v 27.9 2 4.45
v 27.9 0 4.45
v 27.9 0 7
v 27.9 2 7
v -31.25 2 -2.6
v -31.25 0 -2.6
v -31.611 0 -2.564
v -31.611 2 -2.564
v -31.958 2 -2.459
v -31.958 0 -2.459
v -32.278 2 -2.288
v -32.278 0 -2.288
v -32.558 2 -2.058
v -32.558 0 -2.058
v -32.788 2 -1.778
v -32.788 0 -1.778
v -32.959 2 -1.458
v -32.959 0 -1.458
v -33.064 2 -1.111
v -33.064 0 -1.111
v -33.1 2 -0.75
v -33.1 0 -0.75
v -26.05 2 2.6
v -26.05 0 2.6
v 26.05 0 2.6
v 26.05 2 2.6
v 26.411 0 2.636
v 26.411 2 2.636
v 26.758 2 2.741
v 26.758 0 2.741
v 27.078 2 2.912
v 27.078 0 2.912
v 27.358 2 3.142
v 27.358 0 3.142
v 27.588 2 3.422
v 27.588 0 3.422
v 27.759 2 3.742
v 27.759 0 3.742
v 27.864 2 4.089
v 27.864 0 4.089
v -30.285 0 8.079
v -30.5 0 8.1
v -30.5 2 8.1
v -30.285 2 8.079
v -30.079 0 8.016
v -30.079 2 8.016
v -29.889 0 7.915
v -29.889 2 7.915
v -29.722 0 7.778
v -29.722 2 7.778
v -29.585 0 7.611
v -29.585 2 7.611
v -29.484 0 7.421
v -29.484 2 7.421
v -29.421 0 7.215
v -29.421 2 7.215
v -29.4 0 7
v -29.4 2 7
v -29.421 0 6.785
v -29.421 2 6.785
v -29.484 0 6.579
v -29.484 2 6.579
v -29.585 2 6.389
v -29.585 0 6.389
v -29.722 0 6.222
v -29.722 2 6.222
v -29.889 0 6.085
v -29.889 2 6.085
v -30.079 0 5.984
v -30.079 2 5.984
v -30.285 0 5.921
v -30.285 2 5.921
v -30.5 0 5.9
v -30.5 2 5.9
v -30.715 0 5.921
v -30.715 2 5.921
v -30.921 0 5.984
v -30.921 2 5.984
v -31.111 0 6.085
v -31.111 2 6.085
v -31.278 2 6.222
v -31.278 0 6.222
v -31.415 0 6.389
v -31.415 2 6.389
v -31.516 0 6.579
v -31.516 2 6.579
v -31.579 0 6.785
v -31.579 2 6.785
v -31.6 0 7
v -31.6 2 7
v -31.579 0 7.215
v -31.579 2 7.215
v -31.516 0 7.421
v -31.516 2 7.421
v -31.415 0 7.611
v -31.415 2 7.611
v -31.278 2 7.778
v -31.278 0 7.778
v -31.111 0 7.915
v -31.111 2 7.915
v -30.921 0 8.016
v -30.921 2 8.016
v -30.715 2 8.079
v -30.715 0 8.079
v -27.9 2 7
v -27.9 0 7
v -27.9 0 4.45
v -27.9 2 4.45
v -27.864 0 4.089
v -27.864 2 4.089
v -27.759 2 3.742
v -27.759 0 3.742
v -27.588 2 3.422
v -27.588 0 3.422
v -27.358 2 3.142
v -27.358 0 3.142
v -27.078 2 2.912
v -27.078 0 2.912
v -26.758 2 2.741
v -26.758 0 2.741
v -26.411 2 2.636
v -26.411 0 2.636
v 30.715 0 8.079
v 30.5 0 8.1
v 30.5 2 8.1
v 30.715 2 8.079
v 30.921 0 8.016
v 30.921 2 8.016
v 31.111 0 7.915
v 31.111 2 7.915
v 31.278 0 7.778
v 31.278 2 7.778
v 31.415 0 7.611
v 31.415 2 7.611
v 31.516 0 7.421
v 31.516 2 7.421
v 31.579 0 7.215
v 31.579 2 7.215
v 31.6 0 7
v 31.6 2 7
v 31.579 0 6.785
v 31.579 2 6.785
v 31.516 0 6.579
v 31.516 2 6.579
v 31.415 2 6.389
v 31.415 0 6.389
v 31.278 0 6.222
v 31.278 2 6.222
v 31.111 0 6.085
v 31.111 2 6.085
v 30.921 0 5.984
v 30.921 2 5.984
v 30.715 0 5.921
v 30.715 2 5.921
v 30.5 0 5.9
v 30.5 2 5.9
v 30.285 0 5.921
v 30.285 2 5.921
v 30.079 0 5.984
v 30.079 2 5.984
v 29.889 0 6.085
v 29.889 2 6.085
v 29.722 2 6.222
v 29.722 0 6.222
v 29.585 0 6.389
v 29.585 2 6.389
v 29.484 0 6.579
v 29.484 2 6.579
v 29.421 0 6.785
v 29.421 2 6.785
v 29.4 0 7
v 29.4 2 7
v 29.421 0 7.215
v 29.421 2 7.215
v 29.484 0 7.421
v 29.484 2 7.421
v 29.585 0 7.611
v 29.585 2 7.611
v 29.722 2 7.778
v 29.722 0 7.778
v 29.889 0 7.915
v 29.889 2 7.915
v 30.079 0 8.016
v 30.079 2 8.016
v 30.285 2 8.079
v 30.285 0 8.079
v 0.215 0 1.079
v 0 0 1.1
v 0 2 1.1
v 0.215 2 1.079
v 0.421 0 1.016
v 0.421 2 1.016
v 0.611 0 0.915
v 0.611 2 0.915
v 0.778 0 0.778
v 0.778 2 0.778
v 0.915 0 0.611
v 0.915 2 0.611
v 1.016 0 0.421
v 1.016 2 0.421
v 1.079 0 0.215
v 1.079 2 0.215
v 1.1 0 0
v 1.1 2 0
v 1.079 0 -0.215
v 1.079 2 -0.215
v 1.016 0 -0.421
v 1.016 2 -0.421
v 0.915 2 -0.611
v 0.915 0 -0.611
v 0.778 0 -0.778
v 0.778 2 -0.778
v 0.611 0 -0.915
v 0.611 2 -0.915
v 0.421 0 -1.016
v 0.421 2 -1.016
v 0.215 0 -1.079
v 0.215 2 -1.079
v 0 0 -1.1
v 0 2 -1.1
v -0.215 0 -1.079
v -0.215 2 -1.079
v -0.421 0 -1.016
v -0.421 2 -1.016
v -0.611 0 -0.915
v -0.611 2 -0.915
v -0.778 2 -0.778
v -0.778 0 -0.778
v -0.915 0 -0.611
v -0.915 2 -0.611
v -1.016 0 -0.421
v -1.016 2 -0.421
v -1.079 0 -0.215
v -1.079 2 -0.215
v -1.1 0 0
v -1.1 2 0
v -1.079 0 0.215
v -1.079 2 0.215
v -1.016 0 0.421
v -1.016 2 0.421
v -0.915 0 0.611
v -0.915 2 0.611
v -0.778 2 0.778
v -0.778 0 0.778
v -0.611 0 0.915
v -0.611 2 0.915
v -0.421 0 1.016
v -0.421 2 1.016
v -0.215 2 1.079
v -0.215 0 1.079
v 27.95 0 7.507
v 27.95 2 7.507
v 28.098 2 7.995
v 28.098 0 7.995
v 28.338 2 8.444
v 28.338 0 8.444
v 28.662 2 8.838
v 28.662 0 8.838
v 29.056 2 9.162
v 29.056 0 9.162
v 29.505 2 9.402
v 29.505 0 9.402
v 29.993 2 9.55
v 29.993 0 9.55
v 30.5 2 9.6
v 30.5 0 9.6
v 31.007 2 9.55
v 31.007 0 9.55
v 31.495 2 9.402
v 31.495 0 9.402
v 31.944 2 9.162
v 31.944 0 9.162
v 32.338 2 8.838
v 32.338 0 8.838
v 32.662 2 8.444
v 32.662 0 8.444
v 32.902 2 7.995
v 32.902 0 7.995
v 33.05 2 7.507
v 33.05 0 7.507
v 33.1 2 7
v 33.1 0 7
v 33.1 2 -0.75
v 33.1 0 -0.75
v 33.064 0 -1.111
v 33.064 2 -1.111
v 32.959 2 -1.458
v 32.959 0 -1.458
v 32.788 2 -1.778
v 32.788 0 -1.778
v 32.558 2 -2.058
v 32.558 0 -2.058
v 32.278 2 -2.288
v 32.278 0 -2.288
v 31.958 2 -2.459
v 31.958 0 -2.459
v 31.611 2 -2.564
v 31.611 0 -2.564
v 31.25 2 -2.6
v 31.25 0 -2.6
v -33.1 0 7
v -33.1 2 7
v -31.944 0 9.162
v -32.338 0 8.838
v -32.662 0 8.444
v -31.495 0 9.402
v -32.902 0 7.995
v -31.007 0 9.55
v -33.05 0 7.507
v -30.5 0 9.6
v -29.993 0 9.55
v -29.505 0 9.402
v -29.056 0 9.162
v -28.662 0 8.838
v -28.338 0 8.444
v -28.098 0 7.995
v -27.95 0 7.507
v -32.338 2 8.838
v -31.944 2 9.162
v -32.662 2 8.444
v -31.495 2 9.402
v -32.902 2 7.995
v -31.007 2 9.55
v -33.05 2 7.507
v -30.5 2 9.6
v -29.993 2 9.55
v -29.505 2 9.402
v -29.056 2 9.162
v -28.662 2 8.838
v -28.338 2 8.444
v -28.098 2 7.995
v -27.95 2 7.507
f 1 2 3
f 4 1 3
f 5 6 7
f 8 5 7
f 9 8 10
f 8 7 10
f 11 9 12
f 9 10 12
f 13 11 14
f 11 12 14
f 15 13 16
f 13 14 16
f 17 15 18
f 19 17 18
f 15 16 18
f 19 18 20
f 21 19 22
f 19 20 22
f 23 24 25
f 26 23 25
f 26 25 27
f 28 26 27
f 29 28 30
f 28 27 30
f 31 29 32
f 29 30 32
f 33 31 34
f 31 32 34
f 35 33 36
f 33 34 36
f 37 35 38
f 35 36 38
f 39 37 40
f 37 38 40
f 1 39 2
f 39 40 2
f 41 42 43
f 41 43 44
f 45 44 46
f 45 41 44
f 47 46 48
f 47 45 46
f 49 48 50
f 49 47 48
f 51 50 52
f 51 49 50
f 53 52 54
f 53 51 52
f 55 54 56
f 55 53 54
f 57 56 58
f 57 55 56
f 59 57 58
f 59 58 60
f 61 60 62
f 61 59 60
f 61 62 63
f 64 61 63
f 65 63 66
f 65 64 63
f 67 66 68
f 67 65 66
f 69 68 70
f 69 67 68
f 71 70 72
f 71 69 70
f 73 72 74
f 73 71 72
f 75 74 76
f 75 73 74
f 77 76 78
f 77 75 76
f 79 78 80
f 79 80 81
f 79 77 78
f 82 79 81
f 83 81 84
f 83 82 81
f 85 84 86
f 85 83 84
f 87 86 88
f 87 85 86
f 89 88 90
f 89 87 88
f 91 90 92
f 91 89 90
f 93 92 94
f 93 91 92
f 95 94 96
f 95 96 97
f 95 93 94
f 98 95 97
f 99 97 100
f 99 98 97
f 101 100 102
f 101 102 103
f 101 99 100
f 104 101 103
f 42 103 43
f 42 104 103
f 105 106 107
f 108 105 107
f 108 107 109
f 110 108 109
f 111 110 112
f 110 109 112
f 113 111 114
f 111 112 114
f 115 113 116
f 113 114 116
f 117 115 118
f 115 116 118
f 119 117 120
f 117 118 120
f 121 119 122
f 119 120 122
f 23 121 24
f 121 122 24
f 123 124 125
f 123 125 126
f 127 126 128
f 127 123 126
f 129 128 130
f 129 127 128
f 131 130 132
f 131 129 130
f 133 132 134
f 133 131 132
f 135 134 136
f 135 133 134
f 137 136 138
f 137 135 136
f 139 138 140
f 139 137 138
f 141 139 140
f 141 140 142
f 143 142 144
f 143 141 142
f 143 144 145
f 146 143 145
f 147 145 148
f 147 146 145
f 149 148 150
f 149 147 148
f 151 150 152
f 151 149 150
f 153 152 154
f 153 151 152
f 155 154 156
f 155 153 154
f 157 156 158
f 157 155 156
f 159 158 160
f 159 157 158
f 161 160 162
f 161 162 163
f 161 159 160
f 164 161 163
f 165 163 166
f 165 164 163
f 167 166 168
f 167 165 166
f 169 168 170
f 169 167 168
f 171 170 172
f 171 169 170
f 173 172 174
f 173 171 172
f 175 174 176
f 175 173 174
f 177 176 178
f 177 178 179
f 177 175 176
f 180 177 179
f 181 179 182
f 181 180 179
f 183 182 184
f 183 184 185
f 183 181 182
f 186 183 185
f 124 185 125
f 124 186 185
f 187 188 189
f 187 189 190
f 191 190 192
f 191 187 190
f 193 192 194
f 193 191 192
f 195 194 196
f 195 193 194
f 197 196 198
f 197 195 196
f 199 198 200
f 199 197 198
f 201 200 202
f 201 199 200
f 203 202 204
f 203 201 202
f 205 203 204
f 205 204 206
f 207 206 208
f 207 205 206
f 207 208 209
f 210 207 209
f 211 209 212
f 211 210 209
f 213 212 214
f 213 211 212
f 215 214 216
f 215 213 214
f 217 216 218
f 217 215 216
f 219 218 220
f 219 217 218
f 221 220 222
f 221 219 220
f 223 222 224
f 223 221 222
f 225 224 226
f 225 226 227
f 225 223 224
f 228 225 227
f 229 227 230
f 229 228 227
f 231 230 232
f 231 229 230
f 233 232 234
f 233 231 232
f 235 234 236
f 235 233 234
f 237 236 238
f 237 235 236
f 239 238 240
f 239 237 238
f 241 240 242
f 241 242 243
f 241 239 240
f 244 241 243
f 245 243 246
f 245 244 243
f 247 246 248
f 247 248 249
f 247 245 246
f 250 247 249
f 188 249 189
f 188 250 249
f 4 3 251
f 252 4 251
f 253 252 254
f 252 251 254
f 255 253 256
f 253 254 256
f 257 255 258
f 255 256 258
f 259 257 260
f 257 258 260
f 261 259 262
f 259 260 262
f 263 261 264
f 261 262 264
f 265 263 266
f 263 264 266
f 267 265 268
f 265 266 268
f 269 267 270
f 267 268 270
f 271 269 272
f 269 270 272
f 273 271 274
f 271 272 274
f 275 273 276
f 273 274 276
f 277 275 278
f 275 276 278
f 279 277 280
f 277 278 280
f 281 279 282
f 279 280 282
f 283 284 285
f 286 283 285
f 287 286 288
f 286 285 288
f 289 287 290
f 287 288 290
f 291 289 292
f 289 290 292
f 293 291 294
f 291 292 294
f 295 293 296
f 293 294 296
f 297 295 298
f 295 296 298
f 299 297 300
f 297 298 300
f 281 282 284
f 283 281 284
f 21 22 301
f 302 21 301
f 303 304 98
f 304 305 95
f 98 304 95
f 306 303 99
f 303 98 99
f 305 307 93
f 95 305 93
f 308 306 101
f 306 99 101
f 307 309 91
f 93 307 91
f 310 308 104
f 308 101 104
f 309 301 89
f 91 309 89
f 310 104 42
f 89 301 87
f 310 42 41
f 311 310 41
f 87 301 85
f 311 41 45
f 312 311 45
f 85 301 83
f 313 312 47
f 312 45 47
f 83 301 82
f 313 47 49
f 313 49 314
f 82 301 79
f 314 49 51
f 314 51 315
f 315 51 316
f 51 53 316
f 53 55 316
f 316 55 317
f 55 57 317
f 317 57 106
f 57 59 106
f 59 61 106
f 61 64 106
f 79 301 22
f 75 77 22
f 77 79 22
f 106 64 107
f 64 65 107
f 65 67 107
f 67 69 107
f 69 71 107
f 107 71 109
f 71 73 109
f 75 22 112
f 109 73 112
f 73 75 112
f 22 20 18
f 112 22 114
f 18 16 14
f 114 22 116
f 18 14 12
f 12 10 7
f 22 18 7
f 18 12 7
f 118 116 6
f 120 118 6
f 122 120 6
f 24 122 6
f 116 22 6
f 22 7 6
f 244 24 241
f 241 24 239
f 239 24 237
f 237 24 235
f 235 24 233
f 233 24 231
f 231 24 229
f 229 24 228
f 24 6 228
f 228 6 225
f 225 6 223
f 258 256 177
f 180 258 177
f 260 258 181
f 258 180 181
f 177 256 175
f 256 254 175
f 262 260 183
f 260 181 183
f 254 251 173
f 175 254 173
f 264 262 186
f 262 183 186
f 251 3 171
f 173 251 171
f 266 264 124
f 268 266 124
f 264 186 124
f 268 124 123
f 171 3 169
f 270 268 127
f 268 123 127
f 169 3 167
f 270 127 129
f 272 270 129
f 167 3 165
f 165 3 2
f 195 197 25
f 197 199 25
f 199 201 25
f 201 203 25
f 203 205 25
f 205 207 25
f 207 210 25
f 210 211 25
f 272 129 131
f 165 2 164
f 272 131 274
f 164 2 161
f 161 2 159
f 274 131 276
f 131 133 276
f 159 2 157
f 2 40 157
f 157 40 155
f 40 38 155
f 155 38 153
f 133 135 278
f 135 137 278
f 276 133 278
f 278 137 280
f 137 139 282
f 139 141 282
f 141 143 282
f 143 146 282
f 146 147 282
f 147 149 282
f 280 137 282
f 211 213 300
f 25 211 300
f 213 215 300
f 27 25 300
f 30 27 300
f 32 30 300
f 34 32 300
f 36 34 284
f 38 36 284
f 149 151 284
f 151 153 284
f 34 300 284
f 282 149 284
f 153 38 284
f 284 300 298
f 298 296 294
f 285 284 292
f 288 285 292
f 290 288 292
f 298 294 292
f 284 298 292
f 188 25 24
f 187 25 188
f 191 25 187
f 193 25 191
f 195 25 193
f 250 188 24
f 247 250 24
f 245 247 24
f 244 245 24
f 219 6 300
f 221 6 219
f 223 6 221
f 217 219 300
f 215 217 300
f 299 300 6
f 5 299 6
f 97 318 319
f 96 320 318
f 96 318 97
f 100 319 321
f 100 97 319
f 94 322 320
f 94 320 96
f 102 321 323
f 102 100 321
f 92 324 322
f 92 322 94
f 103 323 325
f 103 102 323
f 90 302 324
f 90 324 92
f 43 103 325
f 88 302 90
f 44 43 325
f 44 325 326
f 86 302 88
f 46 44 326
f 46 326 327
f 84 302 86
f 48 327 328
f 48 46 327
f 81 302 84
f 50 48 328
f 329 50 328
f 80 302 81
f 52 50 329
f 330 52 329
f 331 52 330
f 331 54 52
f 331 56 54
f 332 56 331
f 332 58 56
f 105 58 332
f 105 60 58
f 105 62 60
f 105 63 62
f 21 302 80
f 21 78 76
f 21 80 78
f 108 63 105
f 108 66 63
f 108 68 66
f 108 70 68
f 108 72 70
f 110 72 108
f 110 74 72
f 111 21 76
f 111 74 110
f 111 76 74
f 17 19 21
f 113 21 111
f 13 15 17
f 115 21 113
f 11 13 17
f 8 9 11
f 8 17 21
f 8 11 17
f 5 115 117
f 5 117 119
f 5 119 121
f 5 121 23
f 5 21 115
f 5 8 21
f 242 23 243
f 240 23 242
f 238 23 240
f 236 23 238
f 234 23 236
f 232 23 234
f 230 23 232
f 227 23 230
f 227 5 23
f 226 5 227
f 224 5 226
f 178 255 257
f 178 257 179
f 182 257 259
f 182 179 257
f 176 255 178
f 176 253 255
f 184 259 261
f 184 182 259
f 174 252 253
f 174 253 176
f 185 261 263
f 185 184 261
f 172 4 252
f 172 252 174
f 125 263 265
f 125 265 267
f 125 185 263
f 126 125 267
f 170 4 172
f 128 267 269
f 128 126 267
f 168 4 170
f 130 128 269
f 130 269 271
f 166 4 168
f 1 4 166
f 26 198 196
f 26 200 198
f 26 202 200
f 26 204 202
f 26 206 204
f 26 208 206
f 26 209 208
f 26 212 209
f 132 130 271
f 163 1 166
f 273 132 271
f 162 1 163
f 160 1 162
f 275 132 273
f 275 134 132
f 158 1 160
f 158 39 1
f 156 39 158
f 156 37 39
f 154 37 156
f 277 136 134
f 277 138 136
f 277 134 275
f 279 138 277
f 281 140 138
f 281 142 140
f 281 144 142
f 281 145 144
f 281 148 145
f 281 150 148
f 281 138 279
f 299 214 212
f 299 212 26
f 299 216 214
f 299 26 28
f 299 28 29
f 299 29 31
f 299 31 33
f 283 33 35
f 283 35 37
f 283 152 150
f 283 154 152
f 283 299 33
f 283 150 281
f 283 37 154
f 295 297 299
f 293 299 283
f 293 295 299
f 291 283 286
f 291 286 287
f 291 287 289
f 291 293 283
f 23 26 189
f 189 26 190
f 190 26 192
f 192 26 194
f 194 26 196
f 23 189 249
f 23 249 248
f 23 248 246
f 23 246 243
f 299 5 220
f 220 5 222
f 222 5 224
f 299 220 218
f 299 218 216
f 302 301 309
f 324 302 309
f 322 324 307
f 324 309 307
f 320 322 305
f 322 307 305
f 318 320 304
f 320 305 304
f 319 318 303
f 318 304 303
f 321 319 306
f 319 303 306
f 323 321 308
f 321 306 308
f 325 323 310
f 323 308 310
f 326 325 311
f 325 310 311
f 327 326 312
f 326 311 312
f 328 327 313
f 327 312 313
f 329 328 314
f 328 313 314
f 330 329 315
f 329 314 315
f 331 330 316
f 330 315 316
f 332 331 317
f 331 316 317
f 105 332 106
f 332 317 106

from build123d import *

# Parameters (mm, degrees)
SKETCH1_R           = 2.6
SKETCH1_R_2         = 1.1
BOSS_EXTRUDE1_DEPTH = 2


with BuildPart() as part:
    # Sketch1 → Boss-Extrude1 (new body)
    # profile 1 of 5: a face of its own
    with BuildSketch(Plane(origin=(0, 0, 0), x_dir=(1, 0, 0), z_dir=(0, 1, 0))):
        with BuildLine():
            Line((-33.1, 0.75), (-33.1, -7))
            ThreePointArc((-33.1, -7), (-30.5, -4.4), (-27.9, -7))
            Line((-27.9, -7), (-27.9, -4.45))
            ThreePointArc((-27.9, -4.45), (-27.358147545, -3.141852455), (-26.05, -2.6))
            Line((-26.05, -2.6), (-1e-09, -2.6))
            ThreePointArc((-1e-09, -2.6), (-2.6, 7e-09), (1.4e-08, 2.6))
            Line((1.4e-08, 2.6), (-31.25, 2.6))
            ThreePointArc((-31.25, 2.6), (-32.558147545, 2.058147545), (-33.1, 0.75))
        make_face()
    # profile 2 of 5: a face of its own
    with BuildSketch(Plane(origin=(0, 0, 0), x_dir=(1, 0, 0), z_dir=(0, 1, 0))):
        with BuildLine():
            Line((31.25, 2.6), (1.4e-08, 2.6))
            ThreePointArc((1.4e-08, 2.6), (1.838477636, 1.838477626), (2.6, 0))
            ThreePointArc((2.6, 0), (1.838477631, -1.838477632), (-1e-09, -2.6))
            Line((-1e-09, -2.6), (26.05, -2.6))
            ThreePointArc((26.05, -2.6), (27.358147545, -3.141852455), (27.9, -4.45))
            Line((27.9, -4.45), (27.9, -7))
            ThreePointArc((27.9, -7), (30.5, -4.4), (33.1, -7))
            Line((33.1, -7), (33.1, 0.75))
            ThreePointArc((33.1, 0.75), (32.558147545, 2.058147545), (31.25, 2.6))
        make_face()
    # profile 3 of 5: a face of its own
    with BuildSketch(Plane(origin=(0, 0, 0), x_dir=(1, 0, 0), z_dir=(0, 1, 0))):
        Circle(SKETCH1_R)
        with Locations(Location((0, 0, 0), (0, 0, 270))):
            Circle(SKETCH1_R_2, mode=Mode.SUBTRACT)
    # profile 4 of 5: a face of its own
    with BuildSketch(Plane(origin=(0, 0, 0), x_dir=(1, 0, 0), z_dir=(0, 1, 0))):
        with Locations((30.5, -7)):
            Circle(SKETCH1_R)
        with Locations(Location((30.5, -7, 0), (0, 0, 270))):
            Circle(SKETCH1_R_2, mode=Mode.SUBTRACT)
    # profile 5 of 5: a face of its own
    with BuildSketch(Plane(origin=(0, 0, 0), x_dir=(1, 0, 0), z_dir=(0, 1, 0))):
        with Locations((-30.5, -7)):
            Circle(SKETCH1_R)
        with Locations(Location((-30.5, -7, 0), (0, 0, 270))):
            Circle(SKETCH1_R_2, mode=Mode.SUBTRACT)
    extrude(amount=BOSS_EXTRUDE1_DEPTH)


solid = part.part
